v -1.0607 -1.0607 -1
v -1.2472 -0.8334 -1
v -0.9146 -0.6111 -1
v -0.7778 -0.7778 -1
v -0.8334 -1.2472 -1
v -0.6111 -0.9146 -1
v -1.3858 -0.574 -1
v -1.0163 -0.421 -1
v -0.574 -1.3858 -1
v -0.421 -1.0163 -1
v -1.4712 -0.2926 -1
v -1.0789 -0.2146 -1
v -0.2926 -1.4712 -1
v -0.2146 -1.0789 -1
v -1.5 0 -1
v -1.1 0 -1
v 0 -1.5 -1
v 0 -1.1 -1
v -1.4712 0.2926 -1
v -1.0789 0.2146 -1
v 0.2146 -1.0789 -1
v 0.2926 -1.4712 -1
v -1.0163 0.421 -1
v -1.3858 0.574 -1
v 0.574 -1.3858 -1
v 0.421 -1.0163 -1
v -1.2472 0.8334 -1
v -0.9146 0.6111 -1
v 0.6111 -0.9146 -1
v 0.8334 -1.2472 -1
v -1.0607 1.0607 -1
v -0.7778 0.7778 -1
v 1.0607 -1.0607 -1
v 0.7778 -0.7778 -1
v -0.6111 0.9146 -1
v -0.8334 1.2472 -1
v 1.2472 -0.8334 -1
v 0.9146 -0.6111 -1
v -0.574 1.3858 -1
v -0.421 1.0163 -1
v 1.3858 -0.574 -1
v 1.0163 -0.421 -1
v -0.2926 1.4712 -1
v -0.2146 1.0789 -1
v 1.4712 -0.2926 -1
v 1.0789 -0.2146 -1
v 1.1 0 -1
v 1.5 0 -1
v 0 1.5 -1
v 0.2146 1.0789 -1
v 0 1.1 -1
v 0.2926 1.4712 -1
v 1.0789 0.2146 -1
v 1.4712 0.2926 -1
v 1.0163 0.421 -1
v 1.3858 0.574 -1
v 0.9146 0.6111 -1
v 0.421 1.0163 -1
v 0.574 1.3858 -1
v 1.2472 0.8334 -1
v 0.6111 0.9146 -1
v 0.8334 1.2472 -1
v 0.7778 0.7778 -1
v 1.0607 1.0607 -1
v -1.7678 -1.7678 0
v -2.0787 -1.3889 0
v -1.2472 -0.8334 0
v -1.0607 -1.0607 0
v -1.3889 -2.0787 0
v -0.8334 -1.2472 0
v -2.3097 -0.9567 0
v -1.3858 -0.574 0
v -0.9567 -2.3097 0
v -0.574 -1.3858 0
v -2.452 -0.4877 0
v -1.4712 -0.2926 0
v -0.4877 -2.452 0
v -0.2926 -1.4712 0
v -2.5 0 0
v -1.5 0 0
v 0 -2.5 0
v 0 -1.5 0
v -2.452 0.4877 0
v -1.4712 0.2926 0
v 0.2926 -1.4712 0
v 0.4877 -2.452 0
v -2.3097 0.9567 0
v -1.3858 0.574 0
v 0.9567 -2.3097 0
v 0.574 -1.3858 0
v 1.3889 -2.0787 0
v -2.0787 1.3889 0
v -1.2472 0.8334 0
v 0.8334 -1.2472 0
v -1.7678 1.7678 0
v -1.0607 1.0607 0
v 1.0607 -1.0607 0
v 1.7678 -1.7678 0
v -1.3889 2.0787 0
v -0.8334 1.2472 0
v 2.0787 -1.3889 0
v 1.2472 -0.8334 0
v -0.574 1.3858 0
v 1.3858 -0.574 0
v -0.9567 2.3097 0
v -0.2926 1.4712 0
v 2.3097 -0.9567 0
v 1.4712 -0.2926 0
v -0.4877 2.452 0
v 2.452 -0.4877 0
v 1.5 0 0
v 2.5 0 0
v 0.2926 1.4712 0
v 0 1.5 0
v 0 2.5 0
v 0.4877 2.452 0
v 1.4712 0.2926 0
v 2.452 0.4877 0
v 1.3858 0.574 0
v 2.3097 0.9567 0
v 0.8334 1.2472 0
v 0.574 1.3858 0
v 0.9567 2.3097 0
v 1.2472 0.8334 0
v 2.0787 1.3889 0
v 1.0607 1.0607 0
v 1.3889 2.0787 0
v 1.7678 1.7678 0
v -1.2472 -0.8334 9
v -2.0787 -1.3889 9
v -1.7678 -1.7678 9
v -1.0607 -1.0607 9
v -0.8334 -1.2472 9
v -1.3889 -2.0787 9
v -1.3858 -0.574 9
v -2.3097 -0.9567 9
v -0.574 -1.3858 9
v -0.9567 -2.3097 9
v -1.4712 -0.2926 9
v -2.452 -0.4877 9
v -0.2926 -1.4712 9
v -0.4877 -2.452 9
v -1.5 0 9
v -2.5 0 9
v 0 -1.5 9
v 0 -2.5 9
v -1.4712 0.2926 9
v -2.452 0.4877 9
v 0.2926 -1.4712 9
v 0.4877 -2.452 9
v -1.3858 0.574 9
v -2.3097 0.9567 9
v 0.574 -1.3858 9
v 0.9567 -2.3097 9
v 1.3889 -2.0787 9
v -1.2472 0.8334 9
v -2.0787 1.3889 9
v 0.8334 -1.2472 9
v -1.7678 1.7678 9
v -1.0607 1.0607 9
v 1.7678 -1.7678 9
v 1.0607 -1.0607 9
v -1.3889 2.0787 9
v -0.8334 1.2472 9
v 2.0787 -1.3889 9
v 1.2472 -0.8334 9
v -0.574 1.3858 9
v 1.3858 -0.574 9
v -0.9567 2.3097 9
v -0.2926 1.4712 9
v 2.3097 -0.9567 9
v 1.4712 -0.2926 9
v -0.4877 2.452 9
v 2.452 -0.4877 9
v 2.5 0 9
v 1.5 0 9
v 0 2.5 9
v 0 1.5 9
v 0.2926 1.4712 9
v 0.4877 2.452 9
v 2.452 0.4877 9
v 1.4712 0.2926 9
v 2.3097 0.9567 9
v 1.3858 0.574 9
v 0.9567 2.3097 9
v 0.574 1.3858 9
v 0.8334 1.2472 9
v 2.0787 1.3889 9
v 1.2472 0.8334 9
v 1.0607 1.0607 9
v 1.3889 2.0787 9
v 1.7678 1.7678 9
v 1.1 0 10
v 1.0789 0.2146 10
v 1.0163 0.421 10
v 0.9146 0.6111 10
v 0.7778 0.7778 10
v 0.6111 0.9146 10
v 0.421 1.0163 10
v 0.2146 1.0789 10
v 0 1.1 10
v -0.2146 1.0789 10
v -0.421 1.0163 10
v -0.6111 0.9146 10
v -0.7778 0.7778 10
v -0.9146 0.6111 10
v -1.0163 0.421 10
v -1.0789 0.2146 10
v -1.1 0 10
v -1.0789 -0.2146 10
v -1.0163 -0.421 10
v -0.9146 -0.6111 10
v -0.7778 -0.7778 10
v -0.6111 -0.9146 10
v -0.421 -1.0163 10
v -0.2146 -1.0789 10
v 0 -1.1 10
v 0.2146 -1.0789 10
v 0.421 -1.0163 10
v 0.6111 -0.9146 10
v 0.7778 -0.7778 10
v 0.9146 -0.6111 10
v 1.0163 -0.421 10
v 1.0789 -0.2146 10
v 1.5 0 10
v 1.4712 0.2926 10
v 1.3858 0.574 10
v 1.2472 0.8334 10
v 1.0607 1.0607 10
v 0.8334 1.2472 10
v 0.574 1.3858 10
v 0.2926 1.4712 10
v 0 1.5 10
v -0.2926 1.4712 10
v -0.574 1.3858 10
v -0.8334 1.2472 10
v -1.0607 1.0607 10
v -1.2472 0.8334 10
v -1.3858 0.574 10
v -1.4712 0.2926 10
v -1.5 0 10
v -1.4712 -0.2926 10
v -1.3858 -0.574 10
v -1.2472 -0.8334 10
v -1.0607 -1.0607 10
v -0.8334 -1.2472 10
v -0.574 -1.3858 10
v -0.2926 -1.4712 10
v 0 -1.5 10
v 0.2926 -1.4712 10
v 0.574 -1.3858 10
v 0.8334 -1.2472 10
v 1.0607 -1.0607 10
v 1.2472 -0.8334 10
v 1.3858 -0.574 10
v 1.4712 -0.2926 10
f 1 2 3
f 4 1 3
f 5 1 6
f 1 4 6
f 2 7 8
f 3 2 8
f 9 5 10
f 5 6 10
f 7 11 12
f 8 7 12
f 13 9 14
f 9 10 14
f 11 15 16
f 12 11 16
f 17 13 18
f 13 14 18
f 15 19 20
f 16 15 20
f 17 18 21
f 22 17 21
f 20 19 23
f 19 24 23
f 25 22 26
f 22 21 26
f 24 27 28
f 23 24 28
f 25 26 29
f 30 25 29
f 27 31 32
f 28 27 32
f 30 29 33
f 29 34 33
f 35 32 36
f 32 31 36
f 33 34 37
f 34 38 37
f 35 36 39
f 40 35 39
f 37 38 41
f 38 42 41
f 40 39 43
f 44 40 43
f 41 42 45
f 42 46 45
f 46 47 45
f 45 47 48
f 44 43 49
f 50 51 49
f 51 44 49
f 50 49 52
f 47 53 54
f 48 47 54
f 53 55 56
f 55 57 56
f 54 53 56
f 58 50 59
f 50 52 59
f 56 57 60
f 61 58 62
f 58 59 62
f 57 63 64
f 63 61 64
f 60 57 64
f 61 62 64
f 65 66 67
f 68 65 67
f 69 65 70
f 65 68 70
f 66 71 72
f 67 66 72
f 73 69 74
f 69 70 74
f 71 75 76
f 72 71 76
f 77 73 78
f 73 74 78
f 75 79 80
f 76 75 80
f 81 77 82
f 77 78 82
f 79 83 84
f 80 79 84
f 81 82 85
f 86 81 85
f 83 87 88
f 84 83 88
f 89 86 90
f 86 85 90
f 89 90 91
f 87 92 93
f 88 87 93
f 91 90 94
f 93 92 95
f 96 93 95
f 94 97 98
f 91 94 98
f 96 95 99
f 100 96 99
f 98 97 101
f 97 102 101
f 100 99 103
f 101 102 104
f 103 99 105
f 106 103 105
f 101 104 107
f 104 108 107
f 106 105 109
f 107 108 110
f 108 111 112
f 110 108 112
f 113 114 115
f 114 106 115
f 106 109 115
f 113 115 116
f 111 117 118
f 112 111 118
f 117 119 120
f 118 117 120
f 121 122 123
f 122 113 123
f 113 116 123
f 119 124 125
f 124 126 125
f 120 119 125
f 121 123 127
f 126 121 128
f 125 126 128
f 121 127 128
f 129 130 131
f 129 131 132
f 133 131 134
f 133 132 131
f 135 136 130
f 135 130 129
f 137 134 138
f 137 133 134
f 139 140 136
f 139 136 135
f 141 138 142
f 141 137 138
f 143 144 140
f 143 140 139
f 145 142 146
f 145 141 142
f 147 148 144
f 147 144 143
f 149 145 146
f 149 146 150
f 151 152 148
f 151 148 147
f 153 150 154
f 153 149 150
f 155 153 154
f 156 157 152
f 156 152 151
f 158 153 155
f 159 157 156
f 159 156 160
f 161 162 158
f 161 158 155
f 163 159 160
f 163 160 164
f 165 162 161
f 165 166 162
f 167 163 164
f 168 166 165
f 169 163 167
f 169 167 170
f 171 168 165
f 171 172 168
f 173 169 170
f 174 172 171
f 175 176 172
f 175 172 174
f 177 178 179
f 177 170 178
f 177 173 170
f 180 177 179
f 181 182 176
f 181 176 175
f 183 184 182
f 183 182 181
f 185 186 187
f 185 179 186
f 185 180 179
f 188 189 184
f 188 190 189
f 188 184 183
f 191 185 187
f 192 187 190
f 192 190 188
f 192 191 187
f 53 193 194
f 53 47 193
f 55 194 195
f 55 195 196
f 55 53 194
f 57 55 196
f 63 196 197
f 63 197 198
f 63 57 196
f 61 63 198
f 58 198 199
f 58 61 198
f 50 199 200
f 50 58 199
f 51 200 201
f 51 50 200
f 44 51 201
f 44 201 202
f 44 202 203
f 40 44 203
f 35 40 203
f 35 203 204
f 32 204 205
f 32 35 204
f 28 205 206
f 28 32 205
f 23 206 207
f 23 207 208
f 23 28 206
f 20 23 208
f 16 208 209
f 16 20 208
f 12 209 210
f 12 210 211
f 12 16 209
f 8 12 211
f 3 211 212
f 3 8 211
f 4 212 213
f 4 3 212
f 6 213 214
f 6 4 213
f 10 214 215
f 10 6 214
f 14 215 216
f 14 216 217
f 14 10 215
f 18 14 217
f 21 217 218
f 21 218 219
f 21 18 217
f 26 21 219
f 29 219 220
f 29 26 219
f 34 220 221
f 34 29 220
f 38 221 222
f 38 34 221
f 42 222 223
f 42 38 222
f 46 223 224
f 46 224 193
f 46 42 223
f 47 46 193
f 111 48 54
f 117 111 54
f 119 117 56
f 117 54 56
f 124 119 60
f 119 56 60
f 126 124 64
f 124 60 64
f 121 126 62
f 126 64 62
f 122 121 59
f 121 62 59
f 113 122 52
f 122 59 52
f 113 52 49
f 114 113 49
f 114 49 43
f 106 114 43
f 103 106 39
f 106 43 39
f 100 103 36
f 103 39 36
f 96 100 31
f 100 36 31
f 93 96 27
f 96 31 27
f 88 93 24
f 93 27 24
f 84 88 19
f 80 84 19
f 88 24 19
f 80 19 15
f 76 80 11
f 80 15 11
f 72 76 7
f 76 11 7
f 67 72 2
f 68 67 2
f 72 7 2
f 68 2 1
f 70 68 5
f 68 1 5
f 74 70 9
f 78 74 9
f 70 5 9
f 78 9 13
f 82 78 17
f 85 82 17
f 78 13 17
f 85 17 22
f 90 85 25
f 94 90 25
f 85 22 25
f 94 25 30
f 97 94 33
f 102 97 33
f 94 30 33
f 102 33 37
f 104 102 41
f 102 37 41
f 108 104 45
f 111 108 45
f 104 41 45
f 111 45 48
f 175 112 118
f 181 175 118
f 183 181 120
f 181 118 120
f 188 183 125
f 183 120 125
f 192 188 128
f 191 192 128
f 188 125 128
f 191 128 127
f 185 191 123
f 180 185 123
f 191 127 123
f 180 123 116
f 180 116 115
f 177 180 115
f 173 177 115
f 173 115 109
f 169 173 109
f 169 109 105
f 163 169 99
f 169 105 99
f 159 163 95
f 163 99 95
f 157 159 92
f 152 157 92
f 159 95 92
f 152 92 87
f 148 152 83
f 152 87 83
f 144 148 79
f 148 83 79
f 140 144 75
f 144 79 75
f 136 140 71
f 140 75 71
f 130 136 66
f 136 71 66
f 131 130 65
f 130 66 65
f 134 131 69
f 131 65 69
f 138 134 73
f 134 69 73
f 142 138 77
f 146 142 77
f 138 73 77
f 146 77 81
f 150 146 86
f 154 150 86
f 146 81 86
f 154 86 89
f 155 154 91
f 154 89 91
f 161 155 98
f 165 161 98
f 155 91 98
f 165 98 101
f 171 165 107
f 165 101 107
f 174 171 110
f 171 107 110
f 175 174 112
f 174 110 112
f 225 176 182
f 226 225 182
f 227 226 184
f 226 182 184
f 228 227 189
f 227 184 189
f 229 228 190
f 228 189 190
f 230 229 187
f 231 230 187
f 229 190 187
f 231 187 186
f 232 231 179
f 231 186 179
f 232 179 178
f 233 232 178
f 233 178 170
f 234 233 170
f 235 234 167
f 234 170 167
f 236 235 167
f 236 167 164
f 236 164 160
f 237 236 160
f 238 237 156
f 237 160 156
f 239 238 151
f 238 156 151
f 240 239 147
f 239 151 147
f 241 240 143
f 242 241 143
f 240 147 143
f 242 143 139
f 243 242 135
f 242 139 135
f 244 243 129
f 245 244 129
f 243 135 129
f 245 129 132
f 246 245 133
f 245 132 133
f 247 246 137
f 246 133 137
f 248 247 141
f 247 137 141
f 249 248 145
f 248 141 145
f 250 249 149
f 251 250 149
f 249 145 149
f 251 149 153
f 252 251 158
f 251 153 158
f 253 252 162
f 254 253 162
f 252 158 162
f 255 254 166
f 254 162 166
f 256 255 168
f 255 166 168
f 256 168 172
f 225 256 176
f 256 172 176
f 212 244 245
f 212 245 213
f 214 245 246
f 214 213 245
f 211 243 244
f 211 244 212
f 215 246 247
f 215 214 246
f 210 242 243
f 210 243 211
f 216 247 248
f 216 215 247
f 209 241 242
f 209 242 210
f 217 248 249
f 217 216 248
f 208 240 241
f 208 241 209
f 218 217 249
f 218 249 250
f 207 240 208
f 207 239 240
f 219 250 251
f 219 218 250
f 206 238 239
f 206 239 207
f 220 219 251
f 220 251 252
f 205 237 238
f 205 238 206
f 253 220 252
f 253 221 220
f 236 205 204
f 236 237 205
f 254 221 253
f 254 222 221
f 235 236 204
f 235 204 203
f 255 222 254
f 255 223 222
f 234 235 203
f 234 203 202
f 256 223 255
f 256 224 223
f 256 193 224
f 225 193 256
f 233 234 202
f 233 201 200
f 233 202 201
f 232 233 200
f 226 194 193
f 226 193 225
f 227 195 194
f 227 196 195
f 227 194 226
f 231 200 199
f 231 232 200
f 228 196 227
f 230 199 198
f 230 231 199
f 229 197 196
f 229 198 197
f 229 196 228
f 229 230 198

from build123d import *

# Parameters (mm, degrees)
SKETCH1_R                   = 2.5
SKETCH1_R_2                 = 1.1
SHOULDER_SPACER_L9_DEPTH    = 9
LOWER_TORQUE_PILOT_D3_START = -1
SKETCH2_R                   = 1.5
SKETCH2_R_2                 = 1.1
LOWER_TORQUE_PILOT_D3_DEPTH = 1
UPPER_TORQUE_PILOT_D3_START = 9
SKETCH3_R                   = 1.5
SKETCH3_R_2                 = 1.1
UPPER_TORQUE_PILOT_D3_DEPTH = 1


with BuildPart() as part:
    # Sketch1 → Shoulder_Spacer_L9 (new body)
    with BuildSketch(Plane.XY):
        Circle(SKETCH1_R)
        Circle(SKETCH1_R_2, mode=Mode.SUBTRACT)
    extrude(amount=SHOULDER_SPACER_L9_DEPTH)

    # Sketch2 → Lower_Torque_Pilot_D3 (add)
    with BuildSketch(Plane.XY.offset(LOWER_TORQUE_PILOT_D3_START)):
        Circle(SKETCH2_R)
        Circle(SKETCH2_R_2, mode=Mode.SUBTRACT)
    extrude(amount=LOWER_TORQUE_PILOT_D3_DEPTH)

    # Sketch3 → Upper_Torque_Pilot_D3 (add)
    with BuildSketch(Plane.XY.offset(UPPER_TORQUE_PILOT_D3_START)):
        Circle(SKETCH3_R)
        Circle(SKETCH3_R_2, mode=Mode.SUBTRACT)
    extrude(amount=UPPER_TORQUE_PILOT_D3_DEPTH)


solid = part.part
